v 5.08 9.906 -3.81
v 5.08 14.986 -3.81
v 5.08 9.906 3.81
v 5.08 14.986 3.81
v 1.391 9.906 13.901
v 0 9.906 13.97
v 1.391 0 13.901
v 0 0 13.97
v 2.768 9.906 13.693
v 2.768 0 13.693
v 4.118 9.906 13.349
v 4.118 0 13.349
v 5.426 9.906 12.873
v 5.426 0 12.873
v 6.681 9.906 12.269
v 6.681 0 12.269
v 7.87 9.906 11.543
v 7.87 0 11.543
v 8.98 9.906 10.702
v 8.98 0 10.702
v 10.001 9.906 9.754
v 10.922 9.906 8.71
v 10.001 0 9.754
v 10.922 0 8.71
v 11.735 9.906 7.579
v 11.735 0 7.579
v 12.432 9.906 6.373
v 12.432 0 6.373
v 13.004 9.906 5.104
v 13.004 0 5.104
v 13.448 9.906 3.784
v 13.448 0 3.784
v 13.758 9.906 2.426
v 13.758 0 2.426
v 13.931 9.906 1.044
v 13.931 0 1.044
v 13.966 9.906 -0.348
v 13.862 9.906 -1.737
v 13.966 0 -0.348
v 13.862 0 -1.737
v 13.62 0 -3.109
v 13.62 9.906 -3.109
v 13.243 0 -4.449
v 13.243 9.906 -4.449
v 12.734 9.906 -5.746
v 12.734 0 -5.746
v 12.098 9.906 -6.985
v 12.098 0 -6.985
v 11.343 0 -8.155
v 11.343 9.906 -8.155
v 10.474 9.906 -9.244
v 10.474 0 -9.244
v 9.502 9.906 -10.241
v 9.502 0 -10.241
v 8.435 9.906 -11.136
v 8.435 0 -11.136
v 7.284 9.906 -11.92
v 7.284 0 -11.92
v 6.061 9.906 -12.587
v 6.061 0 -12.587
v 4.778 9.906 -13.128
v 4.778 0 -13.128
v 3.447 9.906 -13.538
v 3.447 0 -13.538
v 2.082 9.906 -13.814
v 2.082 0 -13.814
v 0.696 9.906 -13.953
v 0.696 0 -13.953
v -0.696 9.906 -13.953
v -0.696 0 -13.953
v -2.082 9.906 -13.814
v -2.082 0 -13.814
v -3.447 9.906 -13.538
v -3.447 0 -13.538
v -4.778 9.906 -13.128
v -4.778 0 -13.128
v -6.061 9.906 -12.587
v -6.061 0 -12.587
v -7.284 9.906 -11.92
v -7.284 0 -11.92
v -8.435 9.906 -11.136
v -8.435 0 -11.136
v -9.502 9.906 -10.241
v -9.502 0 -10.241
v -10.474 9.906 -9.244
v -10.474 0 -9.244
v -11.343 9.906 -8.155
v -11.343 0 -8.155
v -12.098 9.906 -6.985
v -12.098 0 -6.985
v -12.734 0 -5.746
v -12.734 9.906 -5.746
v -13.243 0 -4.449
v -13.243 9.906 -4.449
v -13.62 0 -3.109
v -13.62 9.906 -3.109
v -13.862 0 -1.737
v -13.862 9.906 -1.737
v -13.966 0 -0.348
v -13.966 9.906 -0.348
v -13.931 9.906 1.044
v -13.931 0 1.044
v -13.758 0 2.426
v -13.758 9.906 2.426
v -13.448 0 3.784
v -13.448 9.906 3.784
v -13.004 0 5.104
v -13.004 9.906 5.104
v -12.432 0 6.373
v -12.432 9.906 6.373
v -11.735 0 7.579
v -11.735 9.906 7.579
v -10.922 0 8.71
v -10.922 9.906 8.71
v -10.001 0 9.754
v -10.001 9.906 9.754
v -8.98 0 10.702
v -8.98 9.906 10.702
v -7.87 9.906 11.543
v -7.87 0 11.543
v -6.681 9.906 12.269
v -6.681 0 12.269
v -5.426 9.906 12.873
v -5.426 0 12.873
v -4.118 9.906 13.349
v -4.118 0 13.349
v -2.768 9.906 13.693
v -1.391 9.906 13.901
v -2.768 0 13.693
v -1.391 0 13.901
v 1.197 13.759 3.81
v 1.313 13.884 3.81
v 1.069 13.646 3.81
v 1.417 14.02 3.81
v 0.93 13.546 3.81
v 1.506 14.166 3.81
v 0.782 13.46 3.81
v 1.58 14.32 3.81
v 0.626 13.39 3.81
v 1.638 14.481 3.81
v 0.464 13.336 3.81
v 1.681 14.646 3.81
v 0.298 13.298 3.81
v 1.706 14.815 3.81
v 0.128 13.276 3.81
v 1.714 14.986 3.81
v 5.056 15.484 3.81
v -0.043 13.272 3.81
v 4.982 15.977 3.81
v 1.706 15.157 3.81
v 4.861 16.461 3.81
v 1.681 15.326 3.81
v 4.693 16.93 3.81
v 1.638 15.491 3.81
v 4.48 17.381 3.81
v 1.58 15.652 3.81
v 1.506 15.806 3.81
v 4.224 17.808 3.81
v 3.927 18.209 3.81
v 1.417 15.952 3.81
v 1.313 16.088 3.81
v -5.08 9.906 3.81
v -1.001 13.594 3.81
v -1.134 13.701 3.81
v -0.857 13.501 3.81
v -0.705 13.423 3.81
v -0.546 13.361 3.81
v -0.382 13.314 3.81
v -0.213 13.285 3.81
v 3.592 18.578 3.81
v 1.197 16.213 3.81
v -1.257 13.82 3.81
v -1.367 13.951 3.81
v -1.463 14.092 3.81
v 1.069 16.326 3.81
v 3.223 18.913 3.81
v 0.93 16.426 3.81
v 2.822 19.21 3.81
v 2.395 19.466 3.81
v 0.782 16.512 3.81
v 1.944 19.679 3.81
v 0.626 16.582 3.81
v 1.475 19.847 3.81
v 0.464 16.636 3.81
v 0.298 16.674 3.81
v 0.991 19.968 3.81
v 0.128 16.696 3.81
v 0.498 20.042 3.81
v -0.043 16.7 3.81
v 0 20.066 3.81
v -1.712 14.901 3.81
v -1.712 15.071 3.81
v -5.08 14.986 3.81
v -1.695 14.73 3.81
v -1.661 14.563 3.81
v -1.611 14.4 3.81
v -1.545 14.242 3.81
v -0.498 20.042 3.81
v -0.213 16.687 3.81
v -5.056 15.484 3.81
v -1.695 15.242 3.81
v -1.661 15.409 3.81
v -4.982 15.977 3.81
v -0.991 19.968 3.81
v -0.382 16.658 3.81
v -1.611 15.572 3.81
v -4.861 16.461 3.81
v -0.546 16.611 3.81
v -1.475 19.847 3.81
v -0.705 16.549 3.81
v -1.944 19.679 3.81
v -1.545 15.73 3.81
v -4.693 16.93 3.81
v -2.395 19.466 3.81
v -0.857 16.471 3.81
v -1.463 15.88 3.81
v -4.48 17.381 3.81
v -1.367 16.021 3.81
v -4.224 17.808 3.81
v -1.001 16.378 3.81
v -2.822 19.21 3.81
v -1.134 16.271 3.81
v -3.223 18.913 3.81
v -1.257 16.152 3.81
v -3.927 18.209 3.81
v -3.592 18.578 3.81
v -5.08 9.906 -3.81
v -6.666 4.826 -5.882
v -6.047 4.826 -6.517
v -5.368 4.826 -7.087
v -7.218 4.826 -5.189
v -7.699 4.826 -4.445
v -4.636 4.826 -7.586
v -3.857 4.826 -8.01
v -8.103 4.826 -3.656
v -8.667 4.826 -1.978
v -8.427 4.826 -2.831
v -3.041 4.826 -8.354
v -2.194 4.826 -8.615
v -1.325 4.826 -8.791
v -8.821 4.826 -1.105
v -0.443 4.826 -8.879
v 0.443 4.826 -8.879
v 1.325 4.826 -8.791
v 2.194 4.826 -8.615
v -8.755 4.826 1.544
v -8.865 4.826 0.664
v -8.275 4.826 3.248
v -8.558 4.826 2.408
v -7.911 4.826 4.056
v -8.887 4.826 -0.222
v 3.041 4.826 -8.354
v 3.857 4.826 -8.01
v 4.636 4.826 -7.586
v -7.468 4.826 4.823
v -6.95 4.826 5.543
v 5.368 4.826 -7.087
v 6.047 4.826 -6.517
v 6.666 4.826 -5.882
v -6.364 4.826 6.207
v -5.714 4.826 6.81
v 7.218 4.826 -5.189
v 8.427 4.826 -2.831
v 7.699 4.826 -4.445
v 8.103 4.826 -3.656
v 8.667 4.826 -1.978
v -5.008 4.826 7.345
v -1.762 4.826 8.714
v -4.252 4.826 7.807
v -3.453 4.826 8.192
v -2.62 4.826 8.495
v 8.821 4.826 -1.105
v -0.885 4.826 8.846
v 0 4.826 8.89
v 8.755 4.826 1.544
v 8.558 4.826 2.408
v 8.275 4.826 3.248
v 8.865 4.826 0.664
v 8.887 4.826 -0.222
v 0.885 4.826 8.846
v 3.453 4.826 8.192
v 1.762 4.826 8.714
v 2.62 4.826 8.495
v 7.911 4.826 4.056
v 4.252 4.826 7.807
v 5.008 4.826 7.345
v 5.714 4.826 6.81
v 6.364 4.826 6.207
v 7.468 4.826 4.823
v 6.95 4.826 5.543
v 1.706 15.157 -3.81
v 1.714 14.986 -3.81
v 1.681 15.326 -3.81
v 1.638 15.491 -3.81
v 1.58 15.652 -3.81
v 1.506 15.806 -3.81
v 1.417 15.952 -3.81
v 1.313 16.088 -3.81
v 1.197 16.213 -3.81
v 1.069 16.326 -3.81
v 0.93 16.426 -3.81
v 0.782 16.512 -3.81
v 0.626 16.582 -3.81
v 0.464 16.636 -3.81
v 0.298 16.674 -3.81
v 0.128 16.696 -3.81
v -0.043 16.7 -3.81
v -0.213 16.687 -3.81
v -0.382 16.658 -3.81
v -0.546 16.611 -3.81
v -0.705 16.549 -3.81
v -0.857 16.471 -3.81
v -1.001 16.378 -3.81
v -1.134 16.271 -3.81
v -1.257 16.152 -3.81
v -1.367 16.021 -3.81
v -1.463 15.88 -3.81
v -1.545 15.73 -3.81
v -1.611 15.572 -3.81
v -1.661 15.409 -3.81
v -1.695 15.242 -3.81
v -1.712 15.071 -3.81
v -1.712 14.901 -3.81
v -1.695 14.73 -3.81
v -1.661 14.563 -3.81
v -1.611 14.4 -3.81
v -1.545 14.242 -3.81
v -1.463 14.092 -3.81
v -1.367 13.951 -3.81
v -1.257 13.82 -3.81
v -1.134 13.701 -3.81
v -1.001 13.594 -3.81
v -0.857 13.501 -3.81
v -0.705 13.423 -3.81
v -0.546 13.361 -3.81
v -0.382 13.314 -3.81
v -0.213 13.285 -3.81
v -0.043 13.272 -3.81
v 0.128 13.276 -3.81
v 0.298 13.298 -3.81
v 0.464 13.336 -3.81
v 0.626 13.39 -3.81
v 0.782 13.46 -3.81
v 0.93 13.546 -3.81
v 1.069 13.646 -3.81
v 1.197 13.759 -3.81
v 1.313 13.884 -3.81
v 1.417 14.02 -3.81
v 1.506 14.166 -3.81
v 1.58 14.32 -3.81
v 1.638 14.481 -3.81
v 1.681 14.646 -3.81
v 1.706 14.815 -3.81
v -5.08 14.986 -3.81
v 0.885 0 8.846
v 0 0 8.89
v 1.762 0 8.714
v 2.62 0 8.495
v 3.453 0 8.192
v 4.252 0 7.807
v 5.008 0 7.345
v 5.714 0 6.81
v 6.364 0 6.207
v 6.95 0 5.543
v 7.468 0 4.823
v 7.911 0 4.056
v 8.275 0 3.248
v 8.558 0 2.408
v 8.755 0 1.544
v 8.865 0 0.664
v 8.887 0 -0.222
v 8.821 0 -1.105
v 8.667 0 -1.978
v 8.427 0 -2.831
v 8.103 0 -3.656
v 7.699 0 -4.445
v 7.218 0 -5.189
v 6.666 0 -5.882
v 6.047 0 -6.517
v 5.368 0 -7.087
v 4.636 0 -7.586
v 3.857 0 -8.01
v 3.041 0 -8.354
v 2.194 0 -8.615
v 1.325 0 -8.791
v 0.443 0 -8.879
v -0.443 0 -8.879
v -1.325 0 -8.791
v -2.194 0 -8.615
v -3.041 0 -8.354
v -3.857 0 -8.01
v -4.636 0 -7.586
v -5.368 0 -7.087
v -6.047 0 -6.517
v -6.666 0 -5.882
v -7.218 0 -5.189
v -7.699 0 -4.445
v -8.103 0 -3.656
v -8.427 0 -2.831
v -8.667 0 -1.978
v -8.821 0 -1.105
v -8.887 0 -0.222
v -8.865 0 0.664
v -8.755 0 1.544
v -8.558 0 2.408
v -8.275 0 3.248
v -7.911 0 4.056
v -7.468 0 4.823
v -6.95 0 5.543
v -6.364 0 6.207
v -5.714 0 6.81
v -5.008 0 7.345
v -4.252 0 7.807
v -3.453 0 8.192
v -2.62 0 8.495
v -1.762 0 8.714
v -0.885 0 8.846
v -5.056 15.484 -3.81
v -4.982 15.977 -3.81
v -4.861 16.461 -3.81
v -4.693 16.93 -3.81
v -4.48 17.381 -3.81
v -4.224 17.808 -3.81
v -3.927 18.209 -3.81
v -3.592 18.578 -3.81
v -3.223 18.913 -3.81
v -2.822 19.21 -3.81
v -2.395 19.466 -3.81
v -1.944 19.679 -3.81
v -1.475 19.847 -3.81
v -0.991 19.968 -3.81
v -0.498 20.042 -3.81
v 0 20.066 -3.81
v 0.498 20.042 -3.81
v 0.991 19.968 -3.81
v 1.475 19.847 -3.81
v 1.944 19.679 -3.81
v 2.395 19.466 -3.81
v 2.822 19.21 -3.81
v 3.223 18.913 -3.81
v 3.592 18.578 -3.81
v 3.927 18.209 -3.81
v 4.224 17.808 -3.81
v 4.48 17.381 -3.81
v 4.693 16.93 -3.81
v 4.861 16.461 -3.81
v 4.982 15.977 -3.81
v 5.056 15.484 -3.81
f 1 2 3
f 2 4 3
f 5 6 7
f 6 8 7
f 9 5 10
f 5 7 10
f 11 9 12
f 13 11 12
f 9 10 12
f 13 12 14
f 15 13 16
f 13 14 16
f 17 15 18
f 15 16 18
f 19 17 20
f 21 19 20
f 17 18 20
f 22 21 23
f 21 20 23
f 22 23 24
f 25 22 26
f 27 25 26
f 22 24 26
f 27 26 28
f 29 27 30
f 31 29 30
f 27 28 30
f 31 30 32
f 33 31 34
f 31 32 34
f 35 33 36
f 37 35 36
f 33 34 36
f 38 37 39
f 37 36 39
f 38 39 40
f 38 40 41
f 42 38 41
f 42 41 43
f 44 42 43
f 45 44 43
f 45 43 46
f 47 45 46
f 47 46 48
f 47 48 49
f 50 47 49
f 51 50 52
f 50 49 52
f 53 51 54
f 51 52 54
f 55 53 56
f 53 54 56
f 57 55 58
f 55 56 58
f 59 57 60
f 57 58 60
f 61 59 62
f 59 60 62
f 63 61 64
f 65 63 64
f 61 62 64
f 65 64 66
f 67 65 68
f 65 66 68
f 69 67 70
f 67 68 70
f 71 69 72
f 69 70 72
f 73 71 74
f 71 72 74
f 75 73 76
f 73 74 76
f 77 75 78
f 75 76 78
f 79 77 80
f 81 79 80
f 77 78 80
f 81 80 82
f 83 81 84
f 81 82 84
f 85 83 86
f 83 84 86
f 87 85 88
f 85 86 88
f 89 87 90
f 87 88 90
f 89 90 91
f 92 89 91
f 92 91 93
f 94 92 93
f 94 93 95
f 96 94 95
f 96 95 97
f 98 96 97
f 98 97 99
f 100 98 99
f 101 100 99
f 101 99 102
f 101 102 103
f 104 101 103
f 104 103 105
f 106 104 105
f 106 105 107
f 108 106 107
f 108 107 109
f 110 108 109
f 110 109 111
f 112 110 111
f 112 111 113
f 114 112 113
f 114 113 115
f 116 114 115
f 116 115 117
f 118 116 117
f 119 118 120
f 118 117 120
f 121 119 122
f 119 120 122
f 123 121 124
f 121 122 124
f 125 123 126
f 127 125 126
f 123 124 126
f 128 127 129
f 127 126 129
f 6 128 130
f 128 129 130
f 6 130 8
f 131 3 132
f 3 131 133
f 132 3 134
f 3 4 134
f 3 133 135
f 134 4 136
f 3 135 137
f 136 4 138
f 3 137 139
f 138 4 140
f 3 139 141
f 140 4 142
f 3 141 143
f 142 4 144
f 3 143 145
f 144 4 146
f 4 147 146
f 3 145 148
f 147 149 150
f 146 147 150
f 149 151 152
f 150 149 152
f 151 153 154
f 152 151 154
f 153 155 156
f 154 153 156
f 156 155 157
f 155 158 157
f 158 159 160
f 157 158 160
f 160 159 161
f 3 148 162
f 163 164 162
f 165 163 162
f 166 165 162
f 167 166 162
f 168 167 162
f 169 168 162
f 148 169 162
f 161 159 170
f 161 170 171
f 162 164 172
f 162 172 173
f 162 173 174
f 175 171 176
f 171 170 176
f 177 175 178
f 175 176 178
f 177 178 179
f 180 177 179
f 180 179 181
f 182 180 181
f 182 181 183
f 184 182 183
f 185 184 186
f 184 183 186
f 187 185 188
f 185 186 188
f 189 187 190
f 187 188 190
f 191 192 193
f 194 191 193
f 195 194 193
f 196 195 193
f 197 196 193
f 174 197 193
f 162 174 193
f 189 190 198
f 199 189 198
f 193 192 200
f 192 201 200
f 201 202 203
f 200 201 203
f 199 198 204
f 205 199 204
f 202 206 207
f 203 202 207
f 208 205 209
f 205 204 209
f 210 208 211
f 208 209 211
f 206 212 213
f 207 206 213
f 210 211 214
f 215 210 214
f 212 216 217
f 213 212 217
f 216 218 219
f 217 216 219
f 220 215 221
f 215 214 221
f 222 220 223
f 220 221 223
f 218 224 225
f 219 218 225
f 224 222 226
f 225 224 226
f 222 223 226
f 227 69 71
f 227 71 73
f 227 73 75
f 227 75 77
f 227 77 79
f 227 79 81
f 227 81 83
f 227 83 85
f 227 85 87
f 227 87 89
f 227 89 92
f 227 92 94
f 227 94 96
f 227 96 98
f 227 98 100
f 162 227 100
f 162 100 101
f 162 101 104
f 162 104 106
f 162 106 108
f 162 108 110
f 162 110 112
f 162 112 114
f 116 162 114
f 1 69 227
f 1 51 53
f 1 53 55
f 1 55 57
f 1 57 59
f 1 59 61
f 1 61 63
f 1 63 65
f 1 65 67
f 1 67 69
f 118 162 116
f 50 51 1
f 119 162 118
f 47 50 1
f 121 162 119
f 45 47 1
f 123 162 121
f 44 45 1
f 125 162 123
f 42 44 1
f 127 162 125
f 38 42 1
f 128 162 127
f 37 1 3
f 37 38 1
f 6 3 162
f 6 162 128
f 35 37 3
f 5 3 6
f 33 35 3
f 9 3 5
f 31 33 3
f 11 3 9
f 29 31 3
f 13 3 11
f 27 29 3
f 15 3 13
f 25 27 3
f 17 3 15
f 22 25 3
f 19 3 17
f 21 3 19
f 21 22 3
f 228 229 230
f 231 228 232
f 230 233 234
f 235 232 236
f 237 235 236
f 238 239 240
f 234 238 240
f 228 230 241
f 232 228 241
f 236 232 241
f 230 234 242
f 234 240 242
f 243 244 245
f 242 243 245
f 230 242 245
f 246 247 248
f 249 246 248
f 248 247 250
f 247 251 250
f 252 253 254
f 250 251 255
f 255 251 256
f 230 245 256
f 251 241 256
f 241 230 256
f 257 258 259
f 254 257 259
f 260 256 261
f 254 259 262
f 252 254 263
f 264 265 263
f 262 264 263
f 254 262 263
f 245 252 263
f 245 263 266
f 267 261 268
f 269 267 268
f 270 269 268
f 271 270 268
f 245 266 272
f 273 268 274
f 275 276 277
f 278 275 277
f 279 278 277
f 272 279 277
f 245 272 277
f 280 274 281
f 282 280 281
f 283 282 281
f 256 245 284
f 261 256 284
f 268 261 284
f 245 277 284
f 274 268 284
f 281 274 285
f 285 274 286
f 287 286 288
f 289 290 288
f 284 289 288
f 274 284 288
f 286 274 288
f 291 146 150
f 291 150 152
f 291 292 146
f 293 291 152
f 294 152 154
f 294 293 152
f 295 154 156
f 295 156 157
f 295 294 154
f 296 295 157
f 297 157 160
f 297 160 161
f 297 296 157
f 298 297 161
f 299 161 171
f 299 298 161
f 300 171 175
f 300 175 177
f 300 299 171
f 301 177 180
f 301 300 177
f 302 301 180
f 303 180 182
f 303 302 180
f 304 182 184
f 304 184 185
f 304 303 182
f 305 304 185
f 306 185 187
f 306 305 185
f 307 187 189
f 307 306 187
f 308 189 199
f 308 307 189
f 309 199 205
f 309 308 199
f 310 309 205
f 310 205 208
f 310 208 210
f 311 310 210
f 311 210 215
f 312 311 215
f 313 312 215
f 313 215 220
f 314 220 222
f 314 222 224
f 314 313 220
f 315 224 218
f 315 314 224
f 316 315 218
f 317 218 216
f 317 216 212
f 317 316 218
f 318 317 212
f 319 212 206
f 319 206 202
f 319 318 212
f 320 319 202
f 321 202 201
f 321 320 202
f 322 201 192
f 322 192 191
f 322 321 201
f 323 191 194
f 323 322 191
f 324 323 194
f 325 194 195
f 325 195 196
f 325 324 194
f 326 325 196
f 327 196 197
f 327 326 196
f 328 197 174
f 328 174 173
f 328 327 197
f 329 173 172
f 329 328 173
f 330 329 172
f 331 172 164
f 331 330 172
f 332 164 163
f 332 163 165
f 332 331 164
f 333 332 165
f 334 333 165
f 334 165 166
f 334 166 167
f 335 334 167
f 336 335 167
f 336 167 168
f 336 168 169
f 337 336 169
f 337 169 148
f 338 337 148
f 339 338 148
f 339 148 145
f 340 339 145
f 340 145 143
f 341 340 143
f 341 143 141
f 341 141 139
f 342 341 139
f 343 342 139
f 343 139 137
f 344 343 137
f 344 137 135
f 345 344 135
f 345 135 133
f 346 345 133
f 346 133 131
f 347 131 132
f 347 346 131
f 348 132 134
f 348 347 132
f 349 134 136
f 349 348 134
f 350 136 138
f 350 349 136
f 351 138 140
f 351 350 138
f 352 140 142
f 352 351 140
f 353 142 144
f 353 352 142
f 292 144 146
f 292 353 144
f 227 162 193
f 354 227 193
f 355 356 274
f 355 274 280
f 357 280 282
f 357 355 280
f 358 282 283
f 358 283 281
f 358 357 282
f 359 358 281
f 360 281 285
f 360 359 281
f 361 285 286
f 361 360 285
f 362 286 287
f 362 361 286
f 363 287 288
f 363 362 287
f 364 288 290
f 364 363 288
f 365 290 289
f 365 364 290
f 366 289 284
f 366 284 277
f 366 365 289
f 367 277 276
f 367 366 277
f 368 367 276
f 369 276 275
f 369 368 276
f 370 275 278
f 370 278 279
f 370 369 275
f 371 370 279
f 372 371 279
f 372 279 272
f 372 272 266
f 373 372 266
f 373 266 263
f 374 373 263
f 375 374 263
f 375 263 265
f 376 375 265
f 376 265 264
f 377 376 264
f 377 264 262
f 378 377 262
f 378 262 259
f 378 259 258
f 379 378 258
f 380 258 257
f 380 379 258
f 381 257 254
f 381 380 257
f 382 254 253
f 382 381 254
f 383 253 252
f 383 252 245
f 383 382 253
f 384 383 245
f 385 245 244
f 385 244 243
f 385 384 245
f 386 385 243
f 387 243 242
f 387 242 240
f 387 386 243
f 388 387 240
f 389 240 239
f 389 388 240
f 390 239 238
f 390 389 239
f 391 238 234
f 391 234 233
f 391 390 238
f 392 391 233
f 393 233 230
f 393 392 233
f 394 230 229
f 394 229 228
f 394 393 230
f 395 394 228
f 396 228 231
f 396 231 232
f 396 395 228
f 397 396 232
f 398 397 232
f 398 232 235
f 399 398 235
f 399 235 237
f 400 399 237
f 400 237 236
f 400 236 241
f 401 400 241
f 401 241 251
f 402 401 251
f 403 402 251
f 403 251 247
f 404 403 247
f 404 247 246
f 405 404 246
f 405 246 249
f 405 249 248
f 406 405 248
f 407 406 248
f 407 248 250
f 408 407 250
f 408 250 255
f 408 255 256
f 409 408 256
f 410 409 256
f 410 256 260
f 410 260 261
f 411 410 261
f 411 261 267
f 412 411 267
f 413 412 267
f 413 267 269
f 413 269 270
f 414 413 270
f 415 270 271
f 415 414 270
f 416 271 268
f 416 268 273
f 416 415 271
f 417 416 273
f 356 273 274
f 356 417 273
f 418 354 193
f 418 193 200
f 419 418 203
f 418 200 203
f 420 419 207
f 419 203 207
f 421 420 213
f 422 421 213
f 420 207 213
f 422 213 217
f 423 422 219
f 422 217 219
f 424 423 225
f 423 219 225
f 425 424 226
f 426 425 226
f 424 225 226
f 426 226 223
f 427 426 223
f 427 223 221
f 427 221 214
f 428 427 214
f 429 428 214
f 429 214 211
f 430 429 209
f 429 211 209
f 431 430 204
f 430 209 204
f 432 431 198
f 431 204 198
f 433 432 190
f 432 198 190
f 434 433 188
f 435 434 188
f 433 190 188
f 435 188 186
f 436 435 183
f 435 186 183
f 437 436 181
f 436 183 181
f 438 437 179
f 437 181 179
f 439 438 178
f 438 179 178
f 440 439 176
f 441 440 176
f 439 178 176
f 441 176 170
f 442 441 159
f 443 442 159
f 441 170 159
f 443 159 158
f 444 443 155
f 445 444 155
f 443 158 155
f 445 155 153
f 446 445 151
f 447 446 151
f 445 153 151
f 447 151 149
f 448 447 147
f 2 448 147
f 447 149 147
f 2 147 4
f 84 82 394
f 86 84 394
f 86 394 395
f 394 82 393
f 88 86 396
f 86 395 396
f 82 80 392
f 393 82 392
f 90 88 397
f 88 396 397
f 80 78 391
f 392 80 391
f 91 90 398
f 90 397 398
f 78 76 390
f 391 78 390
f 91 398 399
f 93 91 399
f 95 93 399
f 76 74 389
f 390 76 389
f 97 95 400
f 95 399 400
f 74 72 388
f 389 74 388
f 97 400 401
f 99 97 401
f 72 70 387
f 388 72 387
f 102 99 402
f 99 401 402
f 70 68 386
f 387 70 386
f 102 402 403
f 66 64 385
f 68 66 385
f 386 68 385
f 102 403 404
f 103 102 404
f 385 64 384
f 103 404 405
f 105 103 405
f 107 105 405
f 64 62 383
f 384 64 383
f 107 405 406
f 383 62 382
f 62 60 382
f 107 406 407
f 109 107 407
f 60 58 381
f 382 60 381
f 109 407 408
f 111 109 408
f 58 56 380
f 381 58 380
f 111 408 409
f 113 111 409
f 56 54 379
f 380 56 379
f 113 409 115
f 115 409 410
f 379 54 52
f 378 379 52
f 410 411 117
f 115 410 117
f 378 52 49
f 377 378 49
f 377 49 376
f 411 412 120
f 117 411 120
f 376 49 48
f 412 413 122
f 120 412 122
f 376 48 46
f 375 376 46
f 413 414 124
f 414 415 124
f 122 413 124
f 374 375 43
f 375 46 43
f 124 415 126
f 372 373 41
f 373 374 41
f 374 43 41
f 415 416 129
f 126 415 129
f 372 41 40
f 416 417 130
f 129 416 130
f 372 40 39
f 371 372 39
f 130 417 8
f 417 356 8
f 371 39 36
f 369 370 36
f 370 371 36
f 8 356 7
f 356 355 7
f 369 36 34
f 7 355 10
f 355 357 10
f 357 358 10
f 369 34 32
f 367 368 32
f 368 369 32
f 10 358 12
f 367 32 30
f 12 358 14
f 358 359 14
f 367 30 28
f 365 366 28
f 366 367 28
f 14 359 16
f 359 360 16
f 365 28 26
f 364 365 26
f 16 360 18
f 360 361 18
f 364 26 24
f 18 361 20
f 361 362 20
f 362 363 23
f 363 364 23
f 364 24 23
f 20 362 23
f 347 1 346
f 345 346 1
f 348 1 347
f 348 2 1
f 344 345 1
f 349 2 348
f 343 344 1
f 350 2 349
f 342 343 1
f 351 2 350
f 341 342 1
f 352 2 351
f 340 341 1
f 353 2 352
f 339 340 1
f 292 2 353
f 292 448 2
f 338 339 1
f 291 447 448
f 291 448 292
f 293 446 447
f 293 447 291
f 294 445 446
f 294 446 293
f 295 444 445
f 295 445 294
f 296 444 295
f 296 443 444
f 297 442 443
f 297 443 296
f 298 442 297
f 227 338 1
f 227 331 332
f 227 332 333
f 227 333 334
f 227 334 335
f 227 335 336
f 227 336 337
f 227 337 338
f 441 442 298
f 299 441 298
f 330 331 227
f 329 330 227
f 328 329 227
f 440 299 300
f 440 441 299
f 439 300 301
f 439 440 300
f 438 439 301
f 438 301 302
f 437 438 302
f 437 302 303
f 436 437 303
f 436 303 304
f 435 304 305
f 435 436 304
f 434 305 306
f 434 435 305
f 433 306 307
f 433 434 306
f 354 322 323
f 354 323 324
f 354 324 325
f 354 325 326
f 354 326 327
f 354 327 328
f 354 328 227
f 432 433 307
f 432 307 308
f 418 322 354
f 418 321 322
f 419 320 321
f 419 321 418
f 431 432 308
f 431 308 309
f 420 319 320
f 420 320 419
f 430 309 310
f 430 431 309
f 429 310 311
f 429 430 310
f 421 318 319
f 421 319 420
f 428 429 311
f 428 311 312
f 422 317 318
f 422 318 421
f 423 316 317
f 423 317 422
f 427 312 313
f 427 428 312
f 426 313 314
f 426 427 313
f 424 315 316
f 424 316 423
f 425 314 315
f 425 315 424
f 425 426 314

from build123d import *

# Parameters (mm, degrees)
SKETCH1_R           = 13.97
SKETCH1_R_2         = 8.89
BOSS_EXTRUDE1_DEPTH = 4.826
SKETCH2_R           = 13.97
BOSS_EXTRUDE2_DEPTH = 5.08
SKETCH3_R           = 1.7145
BOSS_EXTRUDE3_DEPTH = 3.81


with BuildPart() as part:
    # Sketch1 → Boss-Extrude1 (new body)
    with BuildSketch(Plane(origin=(0, 0, 0), x_dir=(1, 0, 0), z_dir=(0, 1, 0))):
        with Locations(Location((0, 0, 0), (0, 0, 270))):  # turned: the seam where the file's is
            Circle(SKETCH1_R)
        with Locations(Location((0, 0, 0), (0, 0, 270))):  # turned: the seam where the file's is
            Circle(SKETCH1_R_2, mode=Mode.SUBTRACT)
    extrude(amount=BOSS_EXTRUDE1_DEPTH)

    # Sketch2 → Boss-Extrude2 (add)
    with BuildSketch(Plane(origin=(0, 4.826, 0), x_dir=(1, 0, 0), z_dir=(0, 1, 0))):
        with Locations(Location((0, 0, 0), (0, 0, 270))):  # turned: the seam where the file's is
            Circle(SKETCH2_R)
    extrude(amount=BOSS_EXTRUDE2_DEPTH)

    # Sketch3 → Boss-Extrude3 (add, symmetric)
    with BuildSketch(Plane.XY):
        with BuildLine():
            Line((-5.08, 9.906), (-5.08, 14.986))
            ThreePointArc((-5.08, 14.986), (0, 20.066), (5.08, 14.986))
            Line((5.08, 14.986), (5.08, 9.906))
            Line((5.08, 9.906), (-5.08, 9.906))
        make_face()
        with Locations((0, 14.986)):
            Circle(SKETCH3_R, mode=Mode.SUBTRACT)
    extrude(amount=BOSS_EXTRUDE3_DEPTH, both=True)


solid = part.part
